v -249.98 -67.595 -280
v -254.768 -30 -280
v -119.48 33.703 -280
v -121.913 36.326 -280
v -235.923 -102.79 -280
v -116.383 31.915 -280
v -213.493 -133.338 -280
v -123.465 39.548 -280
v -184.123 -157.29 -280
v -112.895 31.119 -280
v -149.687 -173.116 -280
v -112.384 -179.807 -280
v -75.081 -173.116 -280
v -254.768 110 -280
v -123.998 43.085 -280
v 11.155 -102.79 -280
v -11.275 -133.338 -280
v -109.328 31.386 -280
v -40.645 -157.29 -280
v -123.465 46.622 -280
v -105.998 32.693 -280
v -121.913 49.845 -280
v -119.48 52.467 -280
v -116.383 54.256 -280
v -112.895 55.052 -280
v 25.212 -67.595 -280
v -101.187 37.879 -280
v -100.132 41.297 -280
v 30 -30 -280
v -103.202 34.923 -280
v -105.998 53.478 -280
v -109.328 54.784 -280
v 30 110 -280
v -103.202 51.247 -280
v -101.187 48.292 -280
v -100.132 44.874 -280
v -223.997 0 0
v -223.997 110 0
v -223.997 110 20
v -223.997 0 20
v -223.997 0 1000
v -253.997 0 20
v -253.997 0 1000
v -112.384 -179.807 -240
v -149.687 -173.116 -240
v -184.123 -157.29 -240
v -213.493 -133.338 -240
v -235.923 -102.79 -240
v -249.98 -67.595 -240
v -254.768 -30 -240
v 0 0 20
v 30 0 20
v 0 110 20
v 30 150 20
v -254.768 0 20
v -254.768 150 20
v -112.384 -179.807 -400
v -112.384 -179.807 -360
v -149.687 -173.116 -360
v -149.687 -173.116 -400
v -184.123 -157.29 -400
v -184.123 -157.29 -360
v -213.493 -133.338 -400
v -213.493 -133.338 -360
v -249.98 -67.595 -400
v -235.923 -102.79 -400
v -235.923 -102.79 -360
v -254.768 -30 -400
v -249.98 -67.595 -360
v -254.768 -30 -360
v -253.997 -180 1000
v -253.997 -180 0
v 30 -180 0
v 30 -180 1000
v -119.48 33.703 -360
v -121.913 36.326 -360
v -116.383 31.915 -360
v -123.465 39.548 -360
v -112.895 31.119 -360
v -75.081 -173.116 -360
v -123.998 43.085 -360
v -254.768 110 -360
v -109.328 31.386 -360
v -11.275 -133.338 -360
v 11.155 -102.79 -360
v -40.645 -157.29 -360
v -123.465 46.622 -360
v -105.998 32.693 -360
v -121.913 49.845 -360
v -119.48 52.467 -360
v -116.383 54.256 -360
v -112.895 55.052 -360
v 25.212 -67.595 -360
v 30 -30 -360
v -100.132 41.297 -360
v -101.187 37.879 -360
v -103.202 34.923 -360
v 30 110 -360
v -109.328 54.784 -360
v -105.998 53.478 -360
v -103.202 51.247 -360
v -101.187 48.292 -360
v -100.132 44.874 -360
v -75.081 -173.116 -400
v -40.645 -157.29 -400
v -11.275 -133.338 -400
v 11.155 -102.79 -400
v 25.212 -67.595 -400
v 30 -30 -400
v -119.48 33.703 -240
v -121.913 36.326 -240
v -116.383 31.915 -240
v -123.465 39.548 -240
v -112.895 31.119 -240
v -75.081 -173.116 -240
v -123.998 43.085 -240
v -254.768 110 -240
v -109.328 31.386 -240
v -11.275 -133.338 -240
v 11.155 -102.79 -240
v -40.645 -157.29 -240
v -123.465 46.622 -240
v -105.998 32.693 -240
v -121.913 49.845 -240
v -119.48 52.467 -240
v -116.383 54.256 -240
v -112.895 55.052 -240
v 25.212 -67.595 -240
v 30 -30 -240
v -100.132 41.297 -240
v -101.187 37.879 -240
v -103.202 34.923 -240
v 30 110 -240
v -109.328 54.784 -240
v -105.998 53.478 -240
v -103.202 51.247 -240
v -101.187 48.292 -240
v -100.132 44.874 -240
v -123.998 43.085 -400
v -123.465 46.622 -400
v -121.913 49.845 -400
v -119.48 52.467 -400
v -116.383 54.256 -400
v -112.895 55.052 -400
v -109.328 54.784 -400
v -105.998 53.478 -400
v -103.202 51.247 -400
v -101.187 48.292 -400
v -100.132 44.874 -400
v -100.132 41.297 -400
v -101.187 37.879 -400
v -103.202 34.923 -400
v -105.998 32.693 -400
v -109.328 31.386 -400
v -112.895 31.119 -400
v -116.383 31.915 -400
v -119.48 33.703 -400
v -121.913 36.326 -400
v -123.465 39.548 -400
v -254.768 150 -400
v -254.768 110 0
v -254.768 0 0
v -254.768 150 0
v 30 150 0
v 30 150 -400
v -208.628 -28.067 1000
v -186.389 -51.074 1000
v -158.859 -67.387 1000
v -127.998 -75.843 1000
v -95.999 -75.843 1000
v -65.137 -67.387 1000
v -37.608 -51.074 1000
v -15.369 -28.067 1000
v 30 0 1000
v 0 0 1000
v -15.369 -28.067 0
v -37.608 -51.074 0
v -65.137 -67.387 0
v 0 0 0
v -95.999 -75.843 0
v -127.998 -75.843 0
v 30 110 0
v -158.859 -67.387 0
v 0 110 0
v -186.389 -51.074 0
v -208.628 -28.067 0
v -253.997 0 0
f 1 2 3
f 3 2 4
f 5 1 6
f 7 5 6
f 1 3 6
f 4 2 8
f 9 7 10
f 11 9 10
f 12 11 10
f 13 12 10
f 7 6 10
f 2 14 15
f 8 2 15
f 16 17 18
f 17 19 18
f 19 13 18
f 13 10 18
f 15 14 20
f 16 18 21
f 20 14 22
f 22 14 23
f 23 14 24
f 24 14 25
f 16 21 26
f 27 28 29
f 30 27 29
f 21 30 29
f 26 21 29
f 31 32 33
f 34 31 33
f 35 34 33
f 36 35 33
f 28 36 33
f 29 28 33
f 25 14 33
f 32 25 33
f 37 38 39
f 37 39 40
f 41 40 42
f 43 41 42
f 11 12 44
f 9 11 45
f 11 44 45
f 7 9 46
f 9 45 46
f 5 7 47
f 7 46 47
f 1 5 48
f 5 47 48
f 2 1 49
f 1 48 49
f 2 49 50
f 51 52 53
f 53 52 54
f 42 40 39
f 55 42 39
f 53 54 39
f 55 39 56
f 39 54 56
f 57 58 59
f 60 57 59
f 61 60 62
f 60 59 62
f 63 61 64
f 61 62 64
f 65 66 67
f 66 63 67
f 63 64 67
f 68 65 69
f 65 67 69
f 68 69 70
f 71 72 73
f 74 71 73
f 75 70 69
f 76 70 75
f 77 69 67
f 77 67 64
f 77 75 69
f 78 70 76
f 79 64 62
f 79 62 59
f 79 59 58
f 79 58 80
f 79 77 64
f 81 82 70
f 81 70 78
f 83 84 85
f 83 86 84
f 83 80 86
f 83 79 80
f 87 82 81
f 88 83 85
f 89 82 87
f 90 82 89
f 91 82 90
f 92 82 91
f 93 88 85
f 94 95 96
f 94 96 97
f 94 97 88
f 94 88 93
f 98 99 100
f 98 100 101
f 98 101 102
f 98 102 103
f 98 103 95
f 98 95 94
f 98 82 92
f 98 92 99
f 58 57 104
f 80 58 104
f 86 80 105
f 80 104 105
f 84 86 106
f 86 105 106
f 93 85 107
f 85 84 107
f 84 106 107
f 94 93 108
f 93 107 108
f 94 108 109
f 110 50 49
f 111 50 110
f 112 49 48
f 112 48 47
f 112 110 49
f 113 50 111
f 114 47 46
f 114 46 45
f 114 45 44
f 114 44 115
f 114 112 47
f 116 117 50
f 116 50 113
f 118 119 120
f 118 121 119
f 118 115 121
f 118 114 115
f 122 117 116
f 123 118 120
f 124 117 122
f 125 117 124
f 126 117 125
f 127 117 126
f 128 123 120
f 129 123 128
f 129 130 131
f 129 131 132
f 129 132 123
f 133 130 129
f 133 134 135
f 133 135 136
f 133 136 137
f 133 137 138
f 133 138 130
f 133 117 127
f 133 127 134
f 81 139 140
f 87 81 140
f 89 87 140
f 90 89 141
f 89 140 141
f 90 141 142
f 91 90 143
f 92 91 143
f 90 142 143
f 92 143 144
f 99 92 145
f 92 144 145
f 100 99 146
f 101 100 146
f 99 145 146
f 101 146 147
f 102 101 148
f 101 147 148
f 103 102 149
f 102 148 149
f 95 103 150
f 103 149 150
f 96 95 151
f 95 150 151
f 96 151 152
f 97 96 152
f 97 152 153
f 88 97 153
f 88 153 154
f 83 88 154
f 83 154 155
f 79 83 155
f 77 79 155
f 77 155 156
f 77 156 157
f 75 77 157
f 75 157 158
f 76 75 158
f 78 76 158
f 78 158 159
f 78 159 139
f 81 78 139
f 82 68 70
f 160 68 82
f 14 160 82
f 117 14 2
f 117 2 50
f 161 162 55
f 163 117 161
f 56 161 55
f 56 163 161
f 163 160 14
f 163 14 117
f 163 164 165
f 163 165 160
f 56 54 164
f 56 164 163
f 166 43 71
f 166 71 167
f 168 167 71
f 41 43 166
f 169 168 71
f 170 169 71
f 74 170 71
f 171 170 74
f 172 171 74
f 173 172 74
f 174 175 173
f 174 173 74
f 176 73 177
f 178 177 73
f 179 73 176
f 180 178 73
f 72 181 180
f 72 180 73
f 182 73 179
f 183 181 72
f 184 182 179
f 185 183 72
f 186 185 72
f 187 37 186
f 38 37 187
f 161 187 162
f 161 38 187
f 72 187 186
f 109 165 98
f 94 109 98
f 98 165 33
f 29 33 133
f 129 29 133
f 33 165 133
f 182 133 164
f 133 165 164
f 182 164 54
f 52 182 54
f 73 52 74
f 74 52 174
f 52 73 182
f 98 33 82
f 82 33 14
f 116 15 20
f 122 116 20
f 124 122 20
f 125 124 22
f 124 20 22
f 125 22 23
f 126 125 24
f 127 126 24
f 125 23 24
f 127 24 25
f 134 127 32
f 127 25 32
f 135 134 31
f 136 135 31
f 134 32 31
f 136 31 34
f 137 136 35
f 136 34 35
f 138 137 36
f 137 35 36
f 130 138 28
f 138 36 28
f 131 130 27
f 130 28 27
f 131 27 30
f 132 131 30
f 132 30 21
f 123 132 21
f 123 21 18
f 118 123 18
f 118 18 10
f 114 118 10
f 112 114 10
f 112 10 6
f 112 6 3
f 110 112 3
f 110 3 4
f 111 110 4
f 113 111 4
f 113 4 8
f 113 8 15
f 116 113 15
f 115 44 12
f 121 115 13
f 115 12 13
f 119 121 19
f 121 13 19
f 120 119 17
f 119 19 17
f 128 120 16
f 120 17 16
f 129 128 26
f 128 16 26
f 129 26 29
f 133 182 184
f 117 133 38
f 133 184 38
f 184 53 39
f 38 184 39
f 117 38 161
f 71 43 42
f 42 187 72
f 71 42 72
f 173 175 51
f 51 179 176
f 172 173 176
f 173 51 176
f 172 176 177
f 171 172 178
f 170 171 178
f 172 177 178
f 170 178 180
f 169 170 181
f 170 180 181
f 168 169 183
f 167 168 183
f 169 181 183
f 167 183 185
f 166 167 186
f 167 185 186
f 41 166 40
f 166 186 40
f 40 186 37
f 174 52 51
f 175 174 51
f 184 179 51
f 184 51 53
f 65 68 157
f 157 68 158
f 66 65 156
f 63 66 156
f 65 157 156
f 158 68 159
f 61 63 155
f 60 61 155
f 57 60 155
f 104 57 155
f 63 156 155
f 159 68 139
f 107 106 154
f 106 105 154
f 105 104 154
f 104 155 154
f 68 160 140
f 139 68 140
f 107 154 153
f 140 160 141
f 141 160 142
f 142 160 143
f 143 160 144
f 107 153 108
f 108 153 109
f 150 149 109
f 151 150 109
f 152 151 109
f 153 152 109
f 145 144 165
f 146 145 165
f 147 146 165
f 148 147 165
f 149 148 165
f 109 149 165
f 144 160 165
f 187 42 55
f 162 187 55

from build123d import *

# Parameters (mm, degrees)
BOSS_EXTRUDE1_DEPTH = 1000
BOSS_EXTRUDE2_DEPTH = 20
SKETCH3_W           = 284.767845469
SKETCH3_H           = 40
BOSS_EXTRUDE4_DEPTH = 400
SKETCH4_W           = 284.767845469
SKETCH4_H           = 40
BOSS_EXTRUDE5_DEPTH = 290
SKETCH7_R           = 12
CUT_EXTRUDE1_DEPTH  = 372
FILLET1_R           = 150


with BuildPart() as part:
    # Sketch1 → Boss-Extrude1 (new body)
    with BuildSketch(Plane.XY):
        with BuildLine():
            Line((-223.996890487, 0), (-253.996890487, 0))
            Line((-253.996890487, 0), (-253.996890487, -180))
            Line((-253.996890487, -180), (30, -180))
            Line((30, -180), (30, 0))
            Line((30, 0), (0, 0))
            ThreePointArc((0, 0), (-111.998445243, -76.914639806), (-223.996890487, 0))
        make_face()
    extrude(amount=BOSS_EXTRUDE1_DEPTH)

    # Sketch2 → Boss-Extrude2 (add)
    with BuildSketch(Plane(origin=(0, 0, 0), x_dir=(-1, 0, 0), z_dir=(0, 0, -1))):
        Polygon((-30, 110), (-30, 0), (0, 0), (0, 110), (223.996890487, 110), (223.996890487, 0), (253.996890487, 0), (254.767845469, 0), (254.767845469, 110), (254.767845469, 150), (223.996890487, 150), (0, 150), (-30, 150), align=None)
    extrude(amount=-BOSS_EXTRUDE2_DEPTH)

    # Sketch3 → Boss-Extrude4 (add)
    with BuildSketch(Plane(origin=(0, 0, 0), x_dir=(-1, 0, 0), z_dir=(0, 0, -1))):
        with Locations((112.383922735, 130)):
            Rectangle(SKETCH3_W, SKETCH3_H)
    extrude(amount=BOSS_EXTRUDE4_DEPTH)

    # Sketch4 → Boss-Extrude5 (add)
    with BuildSketch(Plane.XZ.offset(-110)):
        with Locations((-112.383922735, -380)):
            Rectangle(SKETCH4_W, SKETCH4_H)
        with Locations((-112.383922735, -260)):
            Rectangle(SKETCH4_W, SKETCH4_H)
    extrude(amount=BOSS_EXTRUDE5_DEPTH)

    # Sketch7 → Cut-Extrude1 (cut)
    with BuildSketch(Plane(origin=(0, 0, -400), x_dir=(-1, 0, 0), z_dir=(0, 0, -1))):
        with Locations((111.998445243, 43.085360194)):
            Circle(SKETCH7_R)
    extrude(amount=-CUT_EXTRUDE1_DEPTH, mode=Mode.SUBTRACT)

    # Fillet1
    # the kernel refuses this fillet: 150 mm, written as the material it takes off along each edge
    with BuildSketch(Plane(origin=(-254.767845469, -180, 15), x_dir=(0, 1, 0), z_dir=(0, 0, -1))) as fillet1_piece_1_section:
        with BuildLine():
            CenterArc((FILLET1_R, FILLET1_R), FILLET1_R, 180, 90)
            Line((0, FILLET1_R), (0, 0))
            Line((0, 0), (FILLET1_R, 0))
        make_face()
    fillet1_piece_1 = extrude(amount=790, mode=Mode.PRIVATE)
    fillet1_piece_1 = split(fillet1_piece_1, bisect_by=Plane(origin=(-254.387947187, -110.019667164, -240), z_dir=(0, 0, -1)), keep=Keep.TOP, mode=Mode.PRIVATE)
    add(fillet1_piece_1, mode=Mode.SUBTRACT)
    with BuildSketch(Plane(origin=(30, -180, -775), x_dir=(0, 1, 0), z_dir=(0, 0, 1))) as fillet1_piece_2_section:
        with BuildLine():
            CenterArc((FILLET1_R, FILLET1_R), FILLET1_R, 180, 90)
            Line((0, FILLET1_R), (0, 0))
            Line((0, 0), (FILLET1_R, 0))
        make_face()
    fillet1_piece_2 = extrude(amount=790, mode=Mode.PRIVATE)
    fillet1_piece_2 = split(fillet1_piece_2, bisect_by=Plane(origin=(-3.505190842, -146.494809158, -240), z_dir=(0, 0, -1)), keep=Keep.TOP, mode=Mode.PRIVATE)
    add(fillet1_piece_2, mode=Mode.SUBTRACT)
    with BuildSketch(Plane(origin=(-254.767845469, -180, -655), x_dir=(0, 1, 0), z_dir=(0, 0, 1)), Plane(origin=(30, -180, -240), x_dir=(0, 1, 0), z_dir=(0, 0, -1))) as fillet1_piece_3:
        with BuildLine():
            CenterArc((FILLET1_R, -FILLET1_R), FILLET1_R, 90, 90)
            Line((0, -FILLET1_R), (0, 0))
            Line((0, 0), (FILLET1_R, 0))
        make_face()
    extrude(amount=415, mode=Mode.SUBTRACT)


solid = part.part
